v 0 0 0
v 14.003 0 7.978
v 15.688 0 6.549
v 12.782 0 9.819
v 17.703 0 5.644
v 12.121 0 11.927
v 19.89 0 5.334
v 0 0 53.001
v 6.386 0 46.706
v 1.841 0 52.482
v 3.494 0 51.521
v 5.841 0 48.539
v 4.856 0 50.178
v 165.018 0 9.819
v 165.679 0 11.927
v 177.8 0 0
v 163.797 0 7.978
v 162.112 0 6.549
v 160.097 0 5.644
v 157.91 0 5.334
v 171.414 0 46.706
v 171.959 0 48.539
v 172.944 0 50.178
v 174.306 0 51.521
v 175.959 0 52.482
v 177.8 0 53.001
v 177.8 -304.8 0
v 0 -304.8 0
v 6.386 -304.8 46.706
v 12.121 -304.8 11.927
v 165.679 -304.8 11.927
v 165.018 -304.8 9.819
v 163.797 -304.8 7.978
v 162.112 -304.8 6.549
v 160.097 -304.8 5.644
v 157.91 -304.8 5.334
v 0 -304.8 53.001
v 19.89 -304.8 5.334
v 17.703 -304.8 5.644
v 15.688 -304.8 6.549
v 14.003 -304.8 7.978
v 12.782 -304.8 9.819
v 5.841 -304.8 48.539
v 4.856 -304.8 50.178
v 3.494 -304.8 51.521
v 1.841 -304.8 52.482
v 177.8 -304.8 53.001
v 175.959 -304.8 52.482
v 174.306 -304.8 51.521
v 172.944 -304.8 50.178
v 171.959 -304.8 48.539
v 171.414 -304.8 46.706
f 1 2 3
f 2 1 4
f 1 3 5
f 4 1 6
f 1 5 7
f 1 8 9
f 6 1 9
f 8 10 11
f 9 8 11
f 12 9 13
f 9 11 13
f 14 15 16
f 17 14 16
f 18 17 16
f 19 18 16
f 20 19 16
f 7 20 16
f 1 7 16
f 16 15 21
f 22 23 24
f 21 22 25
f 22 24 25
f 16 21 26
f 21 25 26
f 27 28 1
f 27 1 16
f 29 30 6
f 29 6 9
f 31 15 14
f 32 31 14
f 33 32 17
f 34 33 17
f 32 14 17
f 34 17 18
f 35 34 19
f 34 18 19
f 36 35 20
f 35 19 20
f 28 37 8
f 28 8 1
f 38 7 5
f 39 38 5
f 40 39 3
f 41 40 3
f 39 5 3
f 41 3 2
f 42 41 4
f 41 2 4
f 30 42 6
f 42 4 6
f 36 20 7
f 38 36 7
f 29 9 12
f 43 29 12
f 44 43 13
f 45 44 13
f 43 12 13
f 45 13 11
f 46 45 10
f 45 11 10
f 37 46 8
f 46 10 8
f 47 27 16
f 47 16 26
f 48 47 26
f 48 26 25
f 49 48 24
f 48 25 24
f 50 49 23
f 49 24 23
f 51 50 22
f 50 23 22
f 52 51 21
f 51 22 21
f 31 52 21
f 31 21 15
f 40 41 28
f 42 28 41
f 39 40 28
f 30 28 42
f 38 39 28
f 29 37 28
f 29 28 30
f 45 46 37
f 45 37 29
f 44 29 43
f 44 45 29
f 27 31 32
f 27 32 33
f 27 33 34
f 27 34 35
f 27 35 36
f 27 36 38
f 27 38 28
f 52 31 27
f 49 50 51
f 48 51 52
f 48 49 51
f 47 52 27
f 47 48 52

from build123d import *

# Parameters (mm, degrees)
F1_DEPTH = 304.8


with BuildPart() as f1:
    # F0 (on Front) → F1 (new body)
    with BuildSketch(Plane.XZ):
        with BuildLine():
            Line((0, 53.001386), (0, 0))
            Line((0, 0), (177.8, 0))
            Line((177.8, 0), (177.8, 53.001386))
            ThreePointArc((177.8, 53.001386), (173.582811, 50.892435), (171.413937, 46.705748))
            Line((171.413937, 46.705748), (165.679132, 11.926927))
            ThreePointArc((165.679132, 11.926927), (163.004781, 7.204374), (157.910044, 5.334))
            Line((157.910044, 5.334), (19.889956, 5.334))
            ThreePointArc((19.889956, 5.334), (14.795219, 7.204374), (12.120868, 11.926927))
            Line((12.120868, 11.926927), (6.386063, 46.705748))
            ThreePointArc((6.386063, 46.705748), (4.217189, 50.892435), (0, 53.001386))
        make_face()
    extrude(amount=F1_DEPTH)


solid = f1.part
